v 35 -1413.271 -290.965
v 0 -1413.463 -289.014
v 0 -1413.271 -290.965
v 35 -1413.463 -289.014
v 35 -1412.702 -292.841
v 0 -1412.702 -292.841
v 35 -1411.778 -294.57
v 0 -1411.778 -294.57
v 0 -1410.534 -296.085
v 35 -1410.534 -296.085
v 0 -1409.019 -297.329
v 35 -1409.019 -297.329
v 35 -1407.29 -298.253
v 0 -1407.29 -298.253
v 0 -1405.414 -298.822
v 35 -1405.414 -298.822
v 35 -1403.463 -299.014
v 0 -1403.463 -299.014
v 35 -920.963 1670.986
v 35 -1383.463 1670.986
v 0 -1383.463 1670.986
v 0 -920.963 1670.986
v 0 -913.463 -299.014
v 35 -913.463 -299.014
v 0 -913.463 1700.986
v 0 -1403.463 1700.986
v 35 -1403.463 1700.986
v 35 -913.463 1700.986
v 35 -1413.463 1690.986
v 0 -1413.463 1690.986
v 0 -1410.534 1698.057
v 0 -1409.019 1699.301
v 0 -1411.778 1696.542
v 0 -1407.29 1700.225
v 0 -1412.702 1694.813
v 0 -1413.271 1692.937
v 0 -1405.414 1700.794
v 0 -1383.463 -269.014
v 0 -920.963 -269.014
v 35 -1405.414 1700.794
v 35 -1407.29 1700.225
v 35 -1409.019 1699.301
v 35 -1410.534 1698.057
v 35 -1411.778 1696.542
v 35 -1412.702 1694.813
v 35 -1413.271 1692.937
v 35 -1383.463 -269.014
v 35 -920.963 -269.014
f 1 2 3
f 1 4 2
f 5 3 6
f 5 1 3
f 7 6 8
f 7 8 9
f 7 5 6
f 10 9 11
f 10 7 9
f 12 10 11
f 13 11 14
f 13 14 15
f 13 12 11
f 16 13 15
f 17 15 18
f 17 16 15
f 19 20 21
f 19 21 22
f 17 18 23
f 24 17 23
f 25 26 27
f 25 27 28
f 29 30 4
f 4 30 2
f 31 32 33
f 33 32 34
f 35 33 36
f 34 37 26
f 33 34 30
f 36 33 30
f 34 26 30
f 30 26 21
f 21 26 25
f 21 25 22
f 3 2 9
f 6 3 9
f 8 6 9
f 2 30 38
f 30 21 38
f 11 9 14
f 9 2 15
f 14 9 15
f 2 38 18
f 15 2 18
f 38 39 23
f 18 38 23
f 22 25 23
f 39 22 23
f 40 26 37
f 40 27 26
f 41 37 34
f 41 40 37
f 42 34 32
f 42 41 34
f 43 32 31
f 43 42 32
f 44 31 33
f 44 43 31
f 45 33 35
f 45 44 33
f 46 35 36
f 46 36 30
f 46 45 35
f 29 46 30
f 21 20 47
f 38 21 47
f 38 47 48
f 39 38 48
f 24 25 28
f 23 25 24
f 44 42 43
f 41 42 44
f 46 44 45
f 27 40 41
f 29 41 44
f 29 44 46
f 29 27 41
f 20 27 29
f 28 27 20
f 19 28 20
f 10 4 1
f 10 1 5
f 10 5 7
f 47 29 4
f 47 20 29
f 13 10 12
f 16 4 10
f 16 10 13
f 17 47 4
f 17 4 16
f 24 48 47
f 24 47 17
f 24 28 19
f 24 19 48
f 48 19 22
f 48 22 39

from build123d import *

# Parameters (mm, degrees)
SKETCH1_W           = 2000
SKETCH1_H           = 500
BOSS_EXTRUDE1_DEPTH = 35
SKETCH2_W           = 1940
SKETCH2_H           = 462.5
CUT_EXTRUDE1_DEPTH  = 35
FILLET1_R           = 10


with BuildPart() as part:
    # Sketch1 → Boss-Extrude1 (new body)
    with BuildSketch(Plane(origin=(0, 0, 0), x_dir=(0, 0, -1), z_dir=(1, 0, 0))):
        with Locations((-700.985902425, -1163.463280399)):
            Rectangle(SKETCH1_W, SKETCH1_H)
    extrude(amount=BOSS_EXTRUDE1_DEPTH)

    # Sketch2 → Cut-Extrude1 (cut)
    with BuildSketch(Plane(origin=(35, 0, 0), x_dir=(0, 0, -1), z_dir=(1, 0, 0))):
        with Locations((-700.985902425, -1152.213280399)):
            Rectangle(SKETCH2_W, SKETCH2_H)
    extrude(amount=-CUT_EXTRUDE1_DEPTH, mode=Mode.SUBTRACT)

    # Fillet1
    fillet1_edges = [part.edges().sort_by_distance(p)[0] for p in [
        (17.5, -1413.463280399, -299.014097575),
        (17.5, -1413.463280399, 1700.985902425),
    ]]
    fillet(fillet1_edges, radius=FILLET1_R)


solid = part.part
